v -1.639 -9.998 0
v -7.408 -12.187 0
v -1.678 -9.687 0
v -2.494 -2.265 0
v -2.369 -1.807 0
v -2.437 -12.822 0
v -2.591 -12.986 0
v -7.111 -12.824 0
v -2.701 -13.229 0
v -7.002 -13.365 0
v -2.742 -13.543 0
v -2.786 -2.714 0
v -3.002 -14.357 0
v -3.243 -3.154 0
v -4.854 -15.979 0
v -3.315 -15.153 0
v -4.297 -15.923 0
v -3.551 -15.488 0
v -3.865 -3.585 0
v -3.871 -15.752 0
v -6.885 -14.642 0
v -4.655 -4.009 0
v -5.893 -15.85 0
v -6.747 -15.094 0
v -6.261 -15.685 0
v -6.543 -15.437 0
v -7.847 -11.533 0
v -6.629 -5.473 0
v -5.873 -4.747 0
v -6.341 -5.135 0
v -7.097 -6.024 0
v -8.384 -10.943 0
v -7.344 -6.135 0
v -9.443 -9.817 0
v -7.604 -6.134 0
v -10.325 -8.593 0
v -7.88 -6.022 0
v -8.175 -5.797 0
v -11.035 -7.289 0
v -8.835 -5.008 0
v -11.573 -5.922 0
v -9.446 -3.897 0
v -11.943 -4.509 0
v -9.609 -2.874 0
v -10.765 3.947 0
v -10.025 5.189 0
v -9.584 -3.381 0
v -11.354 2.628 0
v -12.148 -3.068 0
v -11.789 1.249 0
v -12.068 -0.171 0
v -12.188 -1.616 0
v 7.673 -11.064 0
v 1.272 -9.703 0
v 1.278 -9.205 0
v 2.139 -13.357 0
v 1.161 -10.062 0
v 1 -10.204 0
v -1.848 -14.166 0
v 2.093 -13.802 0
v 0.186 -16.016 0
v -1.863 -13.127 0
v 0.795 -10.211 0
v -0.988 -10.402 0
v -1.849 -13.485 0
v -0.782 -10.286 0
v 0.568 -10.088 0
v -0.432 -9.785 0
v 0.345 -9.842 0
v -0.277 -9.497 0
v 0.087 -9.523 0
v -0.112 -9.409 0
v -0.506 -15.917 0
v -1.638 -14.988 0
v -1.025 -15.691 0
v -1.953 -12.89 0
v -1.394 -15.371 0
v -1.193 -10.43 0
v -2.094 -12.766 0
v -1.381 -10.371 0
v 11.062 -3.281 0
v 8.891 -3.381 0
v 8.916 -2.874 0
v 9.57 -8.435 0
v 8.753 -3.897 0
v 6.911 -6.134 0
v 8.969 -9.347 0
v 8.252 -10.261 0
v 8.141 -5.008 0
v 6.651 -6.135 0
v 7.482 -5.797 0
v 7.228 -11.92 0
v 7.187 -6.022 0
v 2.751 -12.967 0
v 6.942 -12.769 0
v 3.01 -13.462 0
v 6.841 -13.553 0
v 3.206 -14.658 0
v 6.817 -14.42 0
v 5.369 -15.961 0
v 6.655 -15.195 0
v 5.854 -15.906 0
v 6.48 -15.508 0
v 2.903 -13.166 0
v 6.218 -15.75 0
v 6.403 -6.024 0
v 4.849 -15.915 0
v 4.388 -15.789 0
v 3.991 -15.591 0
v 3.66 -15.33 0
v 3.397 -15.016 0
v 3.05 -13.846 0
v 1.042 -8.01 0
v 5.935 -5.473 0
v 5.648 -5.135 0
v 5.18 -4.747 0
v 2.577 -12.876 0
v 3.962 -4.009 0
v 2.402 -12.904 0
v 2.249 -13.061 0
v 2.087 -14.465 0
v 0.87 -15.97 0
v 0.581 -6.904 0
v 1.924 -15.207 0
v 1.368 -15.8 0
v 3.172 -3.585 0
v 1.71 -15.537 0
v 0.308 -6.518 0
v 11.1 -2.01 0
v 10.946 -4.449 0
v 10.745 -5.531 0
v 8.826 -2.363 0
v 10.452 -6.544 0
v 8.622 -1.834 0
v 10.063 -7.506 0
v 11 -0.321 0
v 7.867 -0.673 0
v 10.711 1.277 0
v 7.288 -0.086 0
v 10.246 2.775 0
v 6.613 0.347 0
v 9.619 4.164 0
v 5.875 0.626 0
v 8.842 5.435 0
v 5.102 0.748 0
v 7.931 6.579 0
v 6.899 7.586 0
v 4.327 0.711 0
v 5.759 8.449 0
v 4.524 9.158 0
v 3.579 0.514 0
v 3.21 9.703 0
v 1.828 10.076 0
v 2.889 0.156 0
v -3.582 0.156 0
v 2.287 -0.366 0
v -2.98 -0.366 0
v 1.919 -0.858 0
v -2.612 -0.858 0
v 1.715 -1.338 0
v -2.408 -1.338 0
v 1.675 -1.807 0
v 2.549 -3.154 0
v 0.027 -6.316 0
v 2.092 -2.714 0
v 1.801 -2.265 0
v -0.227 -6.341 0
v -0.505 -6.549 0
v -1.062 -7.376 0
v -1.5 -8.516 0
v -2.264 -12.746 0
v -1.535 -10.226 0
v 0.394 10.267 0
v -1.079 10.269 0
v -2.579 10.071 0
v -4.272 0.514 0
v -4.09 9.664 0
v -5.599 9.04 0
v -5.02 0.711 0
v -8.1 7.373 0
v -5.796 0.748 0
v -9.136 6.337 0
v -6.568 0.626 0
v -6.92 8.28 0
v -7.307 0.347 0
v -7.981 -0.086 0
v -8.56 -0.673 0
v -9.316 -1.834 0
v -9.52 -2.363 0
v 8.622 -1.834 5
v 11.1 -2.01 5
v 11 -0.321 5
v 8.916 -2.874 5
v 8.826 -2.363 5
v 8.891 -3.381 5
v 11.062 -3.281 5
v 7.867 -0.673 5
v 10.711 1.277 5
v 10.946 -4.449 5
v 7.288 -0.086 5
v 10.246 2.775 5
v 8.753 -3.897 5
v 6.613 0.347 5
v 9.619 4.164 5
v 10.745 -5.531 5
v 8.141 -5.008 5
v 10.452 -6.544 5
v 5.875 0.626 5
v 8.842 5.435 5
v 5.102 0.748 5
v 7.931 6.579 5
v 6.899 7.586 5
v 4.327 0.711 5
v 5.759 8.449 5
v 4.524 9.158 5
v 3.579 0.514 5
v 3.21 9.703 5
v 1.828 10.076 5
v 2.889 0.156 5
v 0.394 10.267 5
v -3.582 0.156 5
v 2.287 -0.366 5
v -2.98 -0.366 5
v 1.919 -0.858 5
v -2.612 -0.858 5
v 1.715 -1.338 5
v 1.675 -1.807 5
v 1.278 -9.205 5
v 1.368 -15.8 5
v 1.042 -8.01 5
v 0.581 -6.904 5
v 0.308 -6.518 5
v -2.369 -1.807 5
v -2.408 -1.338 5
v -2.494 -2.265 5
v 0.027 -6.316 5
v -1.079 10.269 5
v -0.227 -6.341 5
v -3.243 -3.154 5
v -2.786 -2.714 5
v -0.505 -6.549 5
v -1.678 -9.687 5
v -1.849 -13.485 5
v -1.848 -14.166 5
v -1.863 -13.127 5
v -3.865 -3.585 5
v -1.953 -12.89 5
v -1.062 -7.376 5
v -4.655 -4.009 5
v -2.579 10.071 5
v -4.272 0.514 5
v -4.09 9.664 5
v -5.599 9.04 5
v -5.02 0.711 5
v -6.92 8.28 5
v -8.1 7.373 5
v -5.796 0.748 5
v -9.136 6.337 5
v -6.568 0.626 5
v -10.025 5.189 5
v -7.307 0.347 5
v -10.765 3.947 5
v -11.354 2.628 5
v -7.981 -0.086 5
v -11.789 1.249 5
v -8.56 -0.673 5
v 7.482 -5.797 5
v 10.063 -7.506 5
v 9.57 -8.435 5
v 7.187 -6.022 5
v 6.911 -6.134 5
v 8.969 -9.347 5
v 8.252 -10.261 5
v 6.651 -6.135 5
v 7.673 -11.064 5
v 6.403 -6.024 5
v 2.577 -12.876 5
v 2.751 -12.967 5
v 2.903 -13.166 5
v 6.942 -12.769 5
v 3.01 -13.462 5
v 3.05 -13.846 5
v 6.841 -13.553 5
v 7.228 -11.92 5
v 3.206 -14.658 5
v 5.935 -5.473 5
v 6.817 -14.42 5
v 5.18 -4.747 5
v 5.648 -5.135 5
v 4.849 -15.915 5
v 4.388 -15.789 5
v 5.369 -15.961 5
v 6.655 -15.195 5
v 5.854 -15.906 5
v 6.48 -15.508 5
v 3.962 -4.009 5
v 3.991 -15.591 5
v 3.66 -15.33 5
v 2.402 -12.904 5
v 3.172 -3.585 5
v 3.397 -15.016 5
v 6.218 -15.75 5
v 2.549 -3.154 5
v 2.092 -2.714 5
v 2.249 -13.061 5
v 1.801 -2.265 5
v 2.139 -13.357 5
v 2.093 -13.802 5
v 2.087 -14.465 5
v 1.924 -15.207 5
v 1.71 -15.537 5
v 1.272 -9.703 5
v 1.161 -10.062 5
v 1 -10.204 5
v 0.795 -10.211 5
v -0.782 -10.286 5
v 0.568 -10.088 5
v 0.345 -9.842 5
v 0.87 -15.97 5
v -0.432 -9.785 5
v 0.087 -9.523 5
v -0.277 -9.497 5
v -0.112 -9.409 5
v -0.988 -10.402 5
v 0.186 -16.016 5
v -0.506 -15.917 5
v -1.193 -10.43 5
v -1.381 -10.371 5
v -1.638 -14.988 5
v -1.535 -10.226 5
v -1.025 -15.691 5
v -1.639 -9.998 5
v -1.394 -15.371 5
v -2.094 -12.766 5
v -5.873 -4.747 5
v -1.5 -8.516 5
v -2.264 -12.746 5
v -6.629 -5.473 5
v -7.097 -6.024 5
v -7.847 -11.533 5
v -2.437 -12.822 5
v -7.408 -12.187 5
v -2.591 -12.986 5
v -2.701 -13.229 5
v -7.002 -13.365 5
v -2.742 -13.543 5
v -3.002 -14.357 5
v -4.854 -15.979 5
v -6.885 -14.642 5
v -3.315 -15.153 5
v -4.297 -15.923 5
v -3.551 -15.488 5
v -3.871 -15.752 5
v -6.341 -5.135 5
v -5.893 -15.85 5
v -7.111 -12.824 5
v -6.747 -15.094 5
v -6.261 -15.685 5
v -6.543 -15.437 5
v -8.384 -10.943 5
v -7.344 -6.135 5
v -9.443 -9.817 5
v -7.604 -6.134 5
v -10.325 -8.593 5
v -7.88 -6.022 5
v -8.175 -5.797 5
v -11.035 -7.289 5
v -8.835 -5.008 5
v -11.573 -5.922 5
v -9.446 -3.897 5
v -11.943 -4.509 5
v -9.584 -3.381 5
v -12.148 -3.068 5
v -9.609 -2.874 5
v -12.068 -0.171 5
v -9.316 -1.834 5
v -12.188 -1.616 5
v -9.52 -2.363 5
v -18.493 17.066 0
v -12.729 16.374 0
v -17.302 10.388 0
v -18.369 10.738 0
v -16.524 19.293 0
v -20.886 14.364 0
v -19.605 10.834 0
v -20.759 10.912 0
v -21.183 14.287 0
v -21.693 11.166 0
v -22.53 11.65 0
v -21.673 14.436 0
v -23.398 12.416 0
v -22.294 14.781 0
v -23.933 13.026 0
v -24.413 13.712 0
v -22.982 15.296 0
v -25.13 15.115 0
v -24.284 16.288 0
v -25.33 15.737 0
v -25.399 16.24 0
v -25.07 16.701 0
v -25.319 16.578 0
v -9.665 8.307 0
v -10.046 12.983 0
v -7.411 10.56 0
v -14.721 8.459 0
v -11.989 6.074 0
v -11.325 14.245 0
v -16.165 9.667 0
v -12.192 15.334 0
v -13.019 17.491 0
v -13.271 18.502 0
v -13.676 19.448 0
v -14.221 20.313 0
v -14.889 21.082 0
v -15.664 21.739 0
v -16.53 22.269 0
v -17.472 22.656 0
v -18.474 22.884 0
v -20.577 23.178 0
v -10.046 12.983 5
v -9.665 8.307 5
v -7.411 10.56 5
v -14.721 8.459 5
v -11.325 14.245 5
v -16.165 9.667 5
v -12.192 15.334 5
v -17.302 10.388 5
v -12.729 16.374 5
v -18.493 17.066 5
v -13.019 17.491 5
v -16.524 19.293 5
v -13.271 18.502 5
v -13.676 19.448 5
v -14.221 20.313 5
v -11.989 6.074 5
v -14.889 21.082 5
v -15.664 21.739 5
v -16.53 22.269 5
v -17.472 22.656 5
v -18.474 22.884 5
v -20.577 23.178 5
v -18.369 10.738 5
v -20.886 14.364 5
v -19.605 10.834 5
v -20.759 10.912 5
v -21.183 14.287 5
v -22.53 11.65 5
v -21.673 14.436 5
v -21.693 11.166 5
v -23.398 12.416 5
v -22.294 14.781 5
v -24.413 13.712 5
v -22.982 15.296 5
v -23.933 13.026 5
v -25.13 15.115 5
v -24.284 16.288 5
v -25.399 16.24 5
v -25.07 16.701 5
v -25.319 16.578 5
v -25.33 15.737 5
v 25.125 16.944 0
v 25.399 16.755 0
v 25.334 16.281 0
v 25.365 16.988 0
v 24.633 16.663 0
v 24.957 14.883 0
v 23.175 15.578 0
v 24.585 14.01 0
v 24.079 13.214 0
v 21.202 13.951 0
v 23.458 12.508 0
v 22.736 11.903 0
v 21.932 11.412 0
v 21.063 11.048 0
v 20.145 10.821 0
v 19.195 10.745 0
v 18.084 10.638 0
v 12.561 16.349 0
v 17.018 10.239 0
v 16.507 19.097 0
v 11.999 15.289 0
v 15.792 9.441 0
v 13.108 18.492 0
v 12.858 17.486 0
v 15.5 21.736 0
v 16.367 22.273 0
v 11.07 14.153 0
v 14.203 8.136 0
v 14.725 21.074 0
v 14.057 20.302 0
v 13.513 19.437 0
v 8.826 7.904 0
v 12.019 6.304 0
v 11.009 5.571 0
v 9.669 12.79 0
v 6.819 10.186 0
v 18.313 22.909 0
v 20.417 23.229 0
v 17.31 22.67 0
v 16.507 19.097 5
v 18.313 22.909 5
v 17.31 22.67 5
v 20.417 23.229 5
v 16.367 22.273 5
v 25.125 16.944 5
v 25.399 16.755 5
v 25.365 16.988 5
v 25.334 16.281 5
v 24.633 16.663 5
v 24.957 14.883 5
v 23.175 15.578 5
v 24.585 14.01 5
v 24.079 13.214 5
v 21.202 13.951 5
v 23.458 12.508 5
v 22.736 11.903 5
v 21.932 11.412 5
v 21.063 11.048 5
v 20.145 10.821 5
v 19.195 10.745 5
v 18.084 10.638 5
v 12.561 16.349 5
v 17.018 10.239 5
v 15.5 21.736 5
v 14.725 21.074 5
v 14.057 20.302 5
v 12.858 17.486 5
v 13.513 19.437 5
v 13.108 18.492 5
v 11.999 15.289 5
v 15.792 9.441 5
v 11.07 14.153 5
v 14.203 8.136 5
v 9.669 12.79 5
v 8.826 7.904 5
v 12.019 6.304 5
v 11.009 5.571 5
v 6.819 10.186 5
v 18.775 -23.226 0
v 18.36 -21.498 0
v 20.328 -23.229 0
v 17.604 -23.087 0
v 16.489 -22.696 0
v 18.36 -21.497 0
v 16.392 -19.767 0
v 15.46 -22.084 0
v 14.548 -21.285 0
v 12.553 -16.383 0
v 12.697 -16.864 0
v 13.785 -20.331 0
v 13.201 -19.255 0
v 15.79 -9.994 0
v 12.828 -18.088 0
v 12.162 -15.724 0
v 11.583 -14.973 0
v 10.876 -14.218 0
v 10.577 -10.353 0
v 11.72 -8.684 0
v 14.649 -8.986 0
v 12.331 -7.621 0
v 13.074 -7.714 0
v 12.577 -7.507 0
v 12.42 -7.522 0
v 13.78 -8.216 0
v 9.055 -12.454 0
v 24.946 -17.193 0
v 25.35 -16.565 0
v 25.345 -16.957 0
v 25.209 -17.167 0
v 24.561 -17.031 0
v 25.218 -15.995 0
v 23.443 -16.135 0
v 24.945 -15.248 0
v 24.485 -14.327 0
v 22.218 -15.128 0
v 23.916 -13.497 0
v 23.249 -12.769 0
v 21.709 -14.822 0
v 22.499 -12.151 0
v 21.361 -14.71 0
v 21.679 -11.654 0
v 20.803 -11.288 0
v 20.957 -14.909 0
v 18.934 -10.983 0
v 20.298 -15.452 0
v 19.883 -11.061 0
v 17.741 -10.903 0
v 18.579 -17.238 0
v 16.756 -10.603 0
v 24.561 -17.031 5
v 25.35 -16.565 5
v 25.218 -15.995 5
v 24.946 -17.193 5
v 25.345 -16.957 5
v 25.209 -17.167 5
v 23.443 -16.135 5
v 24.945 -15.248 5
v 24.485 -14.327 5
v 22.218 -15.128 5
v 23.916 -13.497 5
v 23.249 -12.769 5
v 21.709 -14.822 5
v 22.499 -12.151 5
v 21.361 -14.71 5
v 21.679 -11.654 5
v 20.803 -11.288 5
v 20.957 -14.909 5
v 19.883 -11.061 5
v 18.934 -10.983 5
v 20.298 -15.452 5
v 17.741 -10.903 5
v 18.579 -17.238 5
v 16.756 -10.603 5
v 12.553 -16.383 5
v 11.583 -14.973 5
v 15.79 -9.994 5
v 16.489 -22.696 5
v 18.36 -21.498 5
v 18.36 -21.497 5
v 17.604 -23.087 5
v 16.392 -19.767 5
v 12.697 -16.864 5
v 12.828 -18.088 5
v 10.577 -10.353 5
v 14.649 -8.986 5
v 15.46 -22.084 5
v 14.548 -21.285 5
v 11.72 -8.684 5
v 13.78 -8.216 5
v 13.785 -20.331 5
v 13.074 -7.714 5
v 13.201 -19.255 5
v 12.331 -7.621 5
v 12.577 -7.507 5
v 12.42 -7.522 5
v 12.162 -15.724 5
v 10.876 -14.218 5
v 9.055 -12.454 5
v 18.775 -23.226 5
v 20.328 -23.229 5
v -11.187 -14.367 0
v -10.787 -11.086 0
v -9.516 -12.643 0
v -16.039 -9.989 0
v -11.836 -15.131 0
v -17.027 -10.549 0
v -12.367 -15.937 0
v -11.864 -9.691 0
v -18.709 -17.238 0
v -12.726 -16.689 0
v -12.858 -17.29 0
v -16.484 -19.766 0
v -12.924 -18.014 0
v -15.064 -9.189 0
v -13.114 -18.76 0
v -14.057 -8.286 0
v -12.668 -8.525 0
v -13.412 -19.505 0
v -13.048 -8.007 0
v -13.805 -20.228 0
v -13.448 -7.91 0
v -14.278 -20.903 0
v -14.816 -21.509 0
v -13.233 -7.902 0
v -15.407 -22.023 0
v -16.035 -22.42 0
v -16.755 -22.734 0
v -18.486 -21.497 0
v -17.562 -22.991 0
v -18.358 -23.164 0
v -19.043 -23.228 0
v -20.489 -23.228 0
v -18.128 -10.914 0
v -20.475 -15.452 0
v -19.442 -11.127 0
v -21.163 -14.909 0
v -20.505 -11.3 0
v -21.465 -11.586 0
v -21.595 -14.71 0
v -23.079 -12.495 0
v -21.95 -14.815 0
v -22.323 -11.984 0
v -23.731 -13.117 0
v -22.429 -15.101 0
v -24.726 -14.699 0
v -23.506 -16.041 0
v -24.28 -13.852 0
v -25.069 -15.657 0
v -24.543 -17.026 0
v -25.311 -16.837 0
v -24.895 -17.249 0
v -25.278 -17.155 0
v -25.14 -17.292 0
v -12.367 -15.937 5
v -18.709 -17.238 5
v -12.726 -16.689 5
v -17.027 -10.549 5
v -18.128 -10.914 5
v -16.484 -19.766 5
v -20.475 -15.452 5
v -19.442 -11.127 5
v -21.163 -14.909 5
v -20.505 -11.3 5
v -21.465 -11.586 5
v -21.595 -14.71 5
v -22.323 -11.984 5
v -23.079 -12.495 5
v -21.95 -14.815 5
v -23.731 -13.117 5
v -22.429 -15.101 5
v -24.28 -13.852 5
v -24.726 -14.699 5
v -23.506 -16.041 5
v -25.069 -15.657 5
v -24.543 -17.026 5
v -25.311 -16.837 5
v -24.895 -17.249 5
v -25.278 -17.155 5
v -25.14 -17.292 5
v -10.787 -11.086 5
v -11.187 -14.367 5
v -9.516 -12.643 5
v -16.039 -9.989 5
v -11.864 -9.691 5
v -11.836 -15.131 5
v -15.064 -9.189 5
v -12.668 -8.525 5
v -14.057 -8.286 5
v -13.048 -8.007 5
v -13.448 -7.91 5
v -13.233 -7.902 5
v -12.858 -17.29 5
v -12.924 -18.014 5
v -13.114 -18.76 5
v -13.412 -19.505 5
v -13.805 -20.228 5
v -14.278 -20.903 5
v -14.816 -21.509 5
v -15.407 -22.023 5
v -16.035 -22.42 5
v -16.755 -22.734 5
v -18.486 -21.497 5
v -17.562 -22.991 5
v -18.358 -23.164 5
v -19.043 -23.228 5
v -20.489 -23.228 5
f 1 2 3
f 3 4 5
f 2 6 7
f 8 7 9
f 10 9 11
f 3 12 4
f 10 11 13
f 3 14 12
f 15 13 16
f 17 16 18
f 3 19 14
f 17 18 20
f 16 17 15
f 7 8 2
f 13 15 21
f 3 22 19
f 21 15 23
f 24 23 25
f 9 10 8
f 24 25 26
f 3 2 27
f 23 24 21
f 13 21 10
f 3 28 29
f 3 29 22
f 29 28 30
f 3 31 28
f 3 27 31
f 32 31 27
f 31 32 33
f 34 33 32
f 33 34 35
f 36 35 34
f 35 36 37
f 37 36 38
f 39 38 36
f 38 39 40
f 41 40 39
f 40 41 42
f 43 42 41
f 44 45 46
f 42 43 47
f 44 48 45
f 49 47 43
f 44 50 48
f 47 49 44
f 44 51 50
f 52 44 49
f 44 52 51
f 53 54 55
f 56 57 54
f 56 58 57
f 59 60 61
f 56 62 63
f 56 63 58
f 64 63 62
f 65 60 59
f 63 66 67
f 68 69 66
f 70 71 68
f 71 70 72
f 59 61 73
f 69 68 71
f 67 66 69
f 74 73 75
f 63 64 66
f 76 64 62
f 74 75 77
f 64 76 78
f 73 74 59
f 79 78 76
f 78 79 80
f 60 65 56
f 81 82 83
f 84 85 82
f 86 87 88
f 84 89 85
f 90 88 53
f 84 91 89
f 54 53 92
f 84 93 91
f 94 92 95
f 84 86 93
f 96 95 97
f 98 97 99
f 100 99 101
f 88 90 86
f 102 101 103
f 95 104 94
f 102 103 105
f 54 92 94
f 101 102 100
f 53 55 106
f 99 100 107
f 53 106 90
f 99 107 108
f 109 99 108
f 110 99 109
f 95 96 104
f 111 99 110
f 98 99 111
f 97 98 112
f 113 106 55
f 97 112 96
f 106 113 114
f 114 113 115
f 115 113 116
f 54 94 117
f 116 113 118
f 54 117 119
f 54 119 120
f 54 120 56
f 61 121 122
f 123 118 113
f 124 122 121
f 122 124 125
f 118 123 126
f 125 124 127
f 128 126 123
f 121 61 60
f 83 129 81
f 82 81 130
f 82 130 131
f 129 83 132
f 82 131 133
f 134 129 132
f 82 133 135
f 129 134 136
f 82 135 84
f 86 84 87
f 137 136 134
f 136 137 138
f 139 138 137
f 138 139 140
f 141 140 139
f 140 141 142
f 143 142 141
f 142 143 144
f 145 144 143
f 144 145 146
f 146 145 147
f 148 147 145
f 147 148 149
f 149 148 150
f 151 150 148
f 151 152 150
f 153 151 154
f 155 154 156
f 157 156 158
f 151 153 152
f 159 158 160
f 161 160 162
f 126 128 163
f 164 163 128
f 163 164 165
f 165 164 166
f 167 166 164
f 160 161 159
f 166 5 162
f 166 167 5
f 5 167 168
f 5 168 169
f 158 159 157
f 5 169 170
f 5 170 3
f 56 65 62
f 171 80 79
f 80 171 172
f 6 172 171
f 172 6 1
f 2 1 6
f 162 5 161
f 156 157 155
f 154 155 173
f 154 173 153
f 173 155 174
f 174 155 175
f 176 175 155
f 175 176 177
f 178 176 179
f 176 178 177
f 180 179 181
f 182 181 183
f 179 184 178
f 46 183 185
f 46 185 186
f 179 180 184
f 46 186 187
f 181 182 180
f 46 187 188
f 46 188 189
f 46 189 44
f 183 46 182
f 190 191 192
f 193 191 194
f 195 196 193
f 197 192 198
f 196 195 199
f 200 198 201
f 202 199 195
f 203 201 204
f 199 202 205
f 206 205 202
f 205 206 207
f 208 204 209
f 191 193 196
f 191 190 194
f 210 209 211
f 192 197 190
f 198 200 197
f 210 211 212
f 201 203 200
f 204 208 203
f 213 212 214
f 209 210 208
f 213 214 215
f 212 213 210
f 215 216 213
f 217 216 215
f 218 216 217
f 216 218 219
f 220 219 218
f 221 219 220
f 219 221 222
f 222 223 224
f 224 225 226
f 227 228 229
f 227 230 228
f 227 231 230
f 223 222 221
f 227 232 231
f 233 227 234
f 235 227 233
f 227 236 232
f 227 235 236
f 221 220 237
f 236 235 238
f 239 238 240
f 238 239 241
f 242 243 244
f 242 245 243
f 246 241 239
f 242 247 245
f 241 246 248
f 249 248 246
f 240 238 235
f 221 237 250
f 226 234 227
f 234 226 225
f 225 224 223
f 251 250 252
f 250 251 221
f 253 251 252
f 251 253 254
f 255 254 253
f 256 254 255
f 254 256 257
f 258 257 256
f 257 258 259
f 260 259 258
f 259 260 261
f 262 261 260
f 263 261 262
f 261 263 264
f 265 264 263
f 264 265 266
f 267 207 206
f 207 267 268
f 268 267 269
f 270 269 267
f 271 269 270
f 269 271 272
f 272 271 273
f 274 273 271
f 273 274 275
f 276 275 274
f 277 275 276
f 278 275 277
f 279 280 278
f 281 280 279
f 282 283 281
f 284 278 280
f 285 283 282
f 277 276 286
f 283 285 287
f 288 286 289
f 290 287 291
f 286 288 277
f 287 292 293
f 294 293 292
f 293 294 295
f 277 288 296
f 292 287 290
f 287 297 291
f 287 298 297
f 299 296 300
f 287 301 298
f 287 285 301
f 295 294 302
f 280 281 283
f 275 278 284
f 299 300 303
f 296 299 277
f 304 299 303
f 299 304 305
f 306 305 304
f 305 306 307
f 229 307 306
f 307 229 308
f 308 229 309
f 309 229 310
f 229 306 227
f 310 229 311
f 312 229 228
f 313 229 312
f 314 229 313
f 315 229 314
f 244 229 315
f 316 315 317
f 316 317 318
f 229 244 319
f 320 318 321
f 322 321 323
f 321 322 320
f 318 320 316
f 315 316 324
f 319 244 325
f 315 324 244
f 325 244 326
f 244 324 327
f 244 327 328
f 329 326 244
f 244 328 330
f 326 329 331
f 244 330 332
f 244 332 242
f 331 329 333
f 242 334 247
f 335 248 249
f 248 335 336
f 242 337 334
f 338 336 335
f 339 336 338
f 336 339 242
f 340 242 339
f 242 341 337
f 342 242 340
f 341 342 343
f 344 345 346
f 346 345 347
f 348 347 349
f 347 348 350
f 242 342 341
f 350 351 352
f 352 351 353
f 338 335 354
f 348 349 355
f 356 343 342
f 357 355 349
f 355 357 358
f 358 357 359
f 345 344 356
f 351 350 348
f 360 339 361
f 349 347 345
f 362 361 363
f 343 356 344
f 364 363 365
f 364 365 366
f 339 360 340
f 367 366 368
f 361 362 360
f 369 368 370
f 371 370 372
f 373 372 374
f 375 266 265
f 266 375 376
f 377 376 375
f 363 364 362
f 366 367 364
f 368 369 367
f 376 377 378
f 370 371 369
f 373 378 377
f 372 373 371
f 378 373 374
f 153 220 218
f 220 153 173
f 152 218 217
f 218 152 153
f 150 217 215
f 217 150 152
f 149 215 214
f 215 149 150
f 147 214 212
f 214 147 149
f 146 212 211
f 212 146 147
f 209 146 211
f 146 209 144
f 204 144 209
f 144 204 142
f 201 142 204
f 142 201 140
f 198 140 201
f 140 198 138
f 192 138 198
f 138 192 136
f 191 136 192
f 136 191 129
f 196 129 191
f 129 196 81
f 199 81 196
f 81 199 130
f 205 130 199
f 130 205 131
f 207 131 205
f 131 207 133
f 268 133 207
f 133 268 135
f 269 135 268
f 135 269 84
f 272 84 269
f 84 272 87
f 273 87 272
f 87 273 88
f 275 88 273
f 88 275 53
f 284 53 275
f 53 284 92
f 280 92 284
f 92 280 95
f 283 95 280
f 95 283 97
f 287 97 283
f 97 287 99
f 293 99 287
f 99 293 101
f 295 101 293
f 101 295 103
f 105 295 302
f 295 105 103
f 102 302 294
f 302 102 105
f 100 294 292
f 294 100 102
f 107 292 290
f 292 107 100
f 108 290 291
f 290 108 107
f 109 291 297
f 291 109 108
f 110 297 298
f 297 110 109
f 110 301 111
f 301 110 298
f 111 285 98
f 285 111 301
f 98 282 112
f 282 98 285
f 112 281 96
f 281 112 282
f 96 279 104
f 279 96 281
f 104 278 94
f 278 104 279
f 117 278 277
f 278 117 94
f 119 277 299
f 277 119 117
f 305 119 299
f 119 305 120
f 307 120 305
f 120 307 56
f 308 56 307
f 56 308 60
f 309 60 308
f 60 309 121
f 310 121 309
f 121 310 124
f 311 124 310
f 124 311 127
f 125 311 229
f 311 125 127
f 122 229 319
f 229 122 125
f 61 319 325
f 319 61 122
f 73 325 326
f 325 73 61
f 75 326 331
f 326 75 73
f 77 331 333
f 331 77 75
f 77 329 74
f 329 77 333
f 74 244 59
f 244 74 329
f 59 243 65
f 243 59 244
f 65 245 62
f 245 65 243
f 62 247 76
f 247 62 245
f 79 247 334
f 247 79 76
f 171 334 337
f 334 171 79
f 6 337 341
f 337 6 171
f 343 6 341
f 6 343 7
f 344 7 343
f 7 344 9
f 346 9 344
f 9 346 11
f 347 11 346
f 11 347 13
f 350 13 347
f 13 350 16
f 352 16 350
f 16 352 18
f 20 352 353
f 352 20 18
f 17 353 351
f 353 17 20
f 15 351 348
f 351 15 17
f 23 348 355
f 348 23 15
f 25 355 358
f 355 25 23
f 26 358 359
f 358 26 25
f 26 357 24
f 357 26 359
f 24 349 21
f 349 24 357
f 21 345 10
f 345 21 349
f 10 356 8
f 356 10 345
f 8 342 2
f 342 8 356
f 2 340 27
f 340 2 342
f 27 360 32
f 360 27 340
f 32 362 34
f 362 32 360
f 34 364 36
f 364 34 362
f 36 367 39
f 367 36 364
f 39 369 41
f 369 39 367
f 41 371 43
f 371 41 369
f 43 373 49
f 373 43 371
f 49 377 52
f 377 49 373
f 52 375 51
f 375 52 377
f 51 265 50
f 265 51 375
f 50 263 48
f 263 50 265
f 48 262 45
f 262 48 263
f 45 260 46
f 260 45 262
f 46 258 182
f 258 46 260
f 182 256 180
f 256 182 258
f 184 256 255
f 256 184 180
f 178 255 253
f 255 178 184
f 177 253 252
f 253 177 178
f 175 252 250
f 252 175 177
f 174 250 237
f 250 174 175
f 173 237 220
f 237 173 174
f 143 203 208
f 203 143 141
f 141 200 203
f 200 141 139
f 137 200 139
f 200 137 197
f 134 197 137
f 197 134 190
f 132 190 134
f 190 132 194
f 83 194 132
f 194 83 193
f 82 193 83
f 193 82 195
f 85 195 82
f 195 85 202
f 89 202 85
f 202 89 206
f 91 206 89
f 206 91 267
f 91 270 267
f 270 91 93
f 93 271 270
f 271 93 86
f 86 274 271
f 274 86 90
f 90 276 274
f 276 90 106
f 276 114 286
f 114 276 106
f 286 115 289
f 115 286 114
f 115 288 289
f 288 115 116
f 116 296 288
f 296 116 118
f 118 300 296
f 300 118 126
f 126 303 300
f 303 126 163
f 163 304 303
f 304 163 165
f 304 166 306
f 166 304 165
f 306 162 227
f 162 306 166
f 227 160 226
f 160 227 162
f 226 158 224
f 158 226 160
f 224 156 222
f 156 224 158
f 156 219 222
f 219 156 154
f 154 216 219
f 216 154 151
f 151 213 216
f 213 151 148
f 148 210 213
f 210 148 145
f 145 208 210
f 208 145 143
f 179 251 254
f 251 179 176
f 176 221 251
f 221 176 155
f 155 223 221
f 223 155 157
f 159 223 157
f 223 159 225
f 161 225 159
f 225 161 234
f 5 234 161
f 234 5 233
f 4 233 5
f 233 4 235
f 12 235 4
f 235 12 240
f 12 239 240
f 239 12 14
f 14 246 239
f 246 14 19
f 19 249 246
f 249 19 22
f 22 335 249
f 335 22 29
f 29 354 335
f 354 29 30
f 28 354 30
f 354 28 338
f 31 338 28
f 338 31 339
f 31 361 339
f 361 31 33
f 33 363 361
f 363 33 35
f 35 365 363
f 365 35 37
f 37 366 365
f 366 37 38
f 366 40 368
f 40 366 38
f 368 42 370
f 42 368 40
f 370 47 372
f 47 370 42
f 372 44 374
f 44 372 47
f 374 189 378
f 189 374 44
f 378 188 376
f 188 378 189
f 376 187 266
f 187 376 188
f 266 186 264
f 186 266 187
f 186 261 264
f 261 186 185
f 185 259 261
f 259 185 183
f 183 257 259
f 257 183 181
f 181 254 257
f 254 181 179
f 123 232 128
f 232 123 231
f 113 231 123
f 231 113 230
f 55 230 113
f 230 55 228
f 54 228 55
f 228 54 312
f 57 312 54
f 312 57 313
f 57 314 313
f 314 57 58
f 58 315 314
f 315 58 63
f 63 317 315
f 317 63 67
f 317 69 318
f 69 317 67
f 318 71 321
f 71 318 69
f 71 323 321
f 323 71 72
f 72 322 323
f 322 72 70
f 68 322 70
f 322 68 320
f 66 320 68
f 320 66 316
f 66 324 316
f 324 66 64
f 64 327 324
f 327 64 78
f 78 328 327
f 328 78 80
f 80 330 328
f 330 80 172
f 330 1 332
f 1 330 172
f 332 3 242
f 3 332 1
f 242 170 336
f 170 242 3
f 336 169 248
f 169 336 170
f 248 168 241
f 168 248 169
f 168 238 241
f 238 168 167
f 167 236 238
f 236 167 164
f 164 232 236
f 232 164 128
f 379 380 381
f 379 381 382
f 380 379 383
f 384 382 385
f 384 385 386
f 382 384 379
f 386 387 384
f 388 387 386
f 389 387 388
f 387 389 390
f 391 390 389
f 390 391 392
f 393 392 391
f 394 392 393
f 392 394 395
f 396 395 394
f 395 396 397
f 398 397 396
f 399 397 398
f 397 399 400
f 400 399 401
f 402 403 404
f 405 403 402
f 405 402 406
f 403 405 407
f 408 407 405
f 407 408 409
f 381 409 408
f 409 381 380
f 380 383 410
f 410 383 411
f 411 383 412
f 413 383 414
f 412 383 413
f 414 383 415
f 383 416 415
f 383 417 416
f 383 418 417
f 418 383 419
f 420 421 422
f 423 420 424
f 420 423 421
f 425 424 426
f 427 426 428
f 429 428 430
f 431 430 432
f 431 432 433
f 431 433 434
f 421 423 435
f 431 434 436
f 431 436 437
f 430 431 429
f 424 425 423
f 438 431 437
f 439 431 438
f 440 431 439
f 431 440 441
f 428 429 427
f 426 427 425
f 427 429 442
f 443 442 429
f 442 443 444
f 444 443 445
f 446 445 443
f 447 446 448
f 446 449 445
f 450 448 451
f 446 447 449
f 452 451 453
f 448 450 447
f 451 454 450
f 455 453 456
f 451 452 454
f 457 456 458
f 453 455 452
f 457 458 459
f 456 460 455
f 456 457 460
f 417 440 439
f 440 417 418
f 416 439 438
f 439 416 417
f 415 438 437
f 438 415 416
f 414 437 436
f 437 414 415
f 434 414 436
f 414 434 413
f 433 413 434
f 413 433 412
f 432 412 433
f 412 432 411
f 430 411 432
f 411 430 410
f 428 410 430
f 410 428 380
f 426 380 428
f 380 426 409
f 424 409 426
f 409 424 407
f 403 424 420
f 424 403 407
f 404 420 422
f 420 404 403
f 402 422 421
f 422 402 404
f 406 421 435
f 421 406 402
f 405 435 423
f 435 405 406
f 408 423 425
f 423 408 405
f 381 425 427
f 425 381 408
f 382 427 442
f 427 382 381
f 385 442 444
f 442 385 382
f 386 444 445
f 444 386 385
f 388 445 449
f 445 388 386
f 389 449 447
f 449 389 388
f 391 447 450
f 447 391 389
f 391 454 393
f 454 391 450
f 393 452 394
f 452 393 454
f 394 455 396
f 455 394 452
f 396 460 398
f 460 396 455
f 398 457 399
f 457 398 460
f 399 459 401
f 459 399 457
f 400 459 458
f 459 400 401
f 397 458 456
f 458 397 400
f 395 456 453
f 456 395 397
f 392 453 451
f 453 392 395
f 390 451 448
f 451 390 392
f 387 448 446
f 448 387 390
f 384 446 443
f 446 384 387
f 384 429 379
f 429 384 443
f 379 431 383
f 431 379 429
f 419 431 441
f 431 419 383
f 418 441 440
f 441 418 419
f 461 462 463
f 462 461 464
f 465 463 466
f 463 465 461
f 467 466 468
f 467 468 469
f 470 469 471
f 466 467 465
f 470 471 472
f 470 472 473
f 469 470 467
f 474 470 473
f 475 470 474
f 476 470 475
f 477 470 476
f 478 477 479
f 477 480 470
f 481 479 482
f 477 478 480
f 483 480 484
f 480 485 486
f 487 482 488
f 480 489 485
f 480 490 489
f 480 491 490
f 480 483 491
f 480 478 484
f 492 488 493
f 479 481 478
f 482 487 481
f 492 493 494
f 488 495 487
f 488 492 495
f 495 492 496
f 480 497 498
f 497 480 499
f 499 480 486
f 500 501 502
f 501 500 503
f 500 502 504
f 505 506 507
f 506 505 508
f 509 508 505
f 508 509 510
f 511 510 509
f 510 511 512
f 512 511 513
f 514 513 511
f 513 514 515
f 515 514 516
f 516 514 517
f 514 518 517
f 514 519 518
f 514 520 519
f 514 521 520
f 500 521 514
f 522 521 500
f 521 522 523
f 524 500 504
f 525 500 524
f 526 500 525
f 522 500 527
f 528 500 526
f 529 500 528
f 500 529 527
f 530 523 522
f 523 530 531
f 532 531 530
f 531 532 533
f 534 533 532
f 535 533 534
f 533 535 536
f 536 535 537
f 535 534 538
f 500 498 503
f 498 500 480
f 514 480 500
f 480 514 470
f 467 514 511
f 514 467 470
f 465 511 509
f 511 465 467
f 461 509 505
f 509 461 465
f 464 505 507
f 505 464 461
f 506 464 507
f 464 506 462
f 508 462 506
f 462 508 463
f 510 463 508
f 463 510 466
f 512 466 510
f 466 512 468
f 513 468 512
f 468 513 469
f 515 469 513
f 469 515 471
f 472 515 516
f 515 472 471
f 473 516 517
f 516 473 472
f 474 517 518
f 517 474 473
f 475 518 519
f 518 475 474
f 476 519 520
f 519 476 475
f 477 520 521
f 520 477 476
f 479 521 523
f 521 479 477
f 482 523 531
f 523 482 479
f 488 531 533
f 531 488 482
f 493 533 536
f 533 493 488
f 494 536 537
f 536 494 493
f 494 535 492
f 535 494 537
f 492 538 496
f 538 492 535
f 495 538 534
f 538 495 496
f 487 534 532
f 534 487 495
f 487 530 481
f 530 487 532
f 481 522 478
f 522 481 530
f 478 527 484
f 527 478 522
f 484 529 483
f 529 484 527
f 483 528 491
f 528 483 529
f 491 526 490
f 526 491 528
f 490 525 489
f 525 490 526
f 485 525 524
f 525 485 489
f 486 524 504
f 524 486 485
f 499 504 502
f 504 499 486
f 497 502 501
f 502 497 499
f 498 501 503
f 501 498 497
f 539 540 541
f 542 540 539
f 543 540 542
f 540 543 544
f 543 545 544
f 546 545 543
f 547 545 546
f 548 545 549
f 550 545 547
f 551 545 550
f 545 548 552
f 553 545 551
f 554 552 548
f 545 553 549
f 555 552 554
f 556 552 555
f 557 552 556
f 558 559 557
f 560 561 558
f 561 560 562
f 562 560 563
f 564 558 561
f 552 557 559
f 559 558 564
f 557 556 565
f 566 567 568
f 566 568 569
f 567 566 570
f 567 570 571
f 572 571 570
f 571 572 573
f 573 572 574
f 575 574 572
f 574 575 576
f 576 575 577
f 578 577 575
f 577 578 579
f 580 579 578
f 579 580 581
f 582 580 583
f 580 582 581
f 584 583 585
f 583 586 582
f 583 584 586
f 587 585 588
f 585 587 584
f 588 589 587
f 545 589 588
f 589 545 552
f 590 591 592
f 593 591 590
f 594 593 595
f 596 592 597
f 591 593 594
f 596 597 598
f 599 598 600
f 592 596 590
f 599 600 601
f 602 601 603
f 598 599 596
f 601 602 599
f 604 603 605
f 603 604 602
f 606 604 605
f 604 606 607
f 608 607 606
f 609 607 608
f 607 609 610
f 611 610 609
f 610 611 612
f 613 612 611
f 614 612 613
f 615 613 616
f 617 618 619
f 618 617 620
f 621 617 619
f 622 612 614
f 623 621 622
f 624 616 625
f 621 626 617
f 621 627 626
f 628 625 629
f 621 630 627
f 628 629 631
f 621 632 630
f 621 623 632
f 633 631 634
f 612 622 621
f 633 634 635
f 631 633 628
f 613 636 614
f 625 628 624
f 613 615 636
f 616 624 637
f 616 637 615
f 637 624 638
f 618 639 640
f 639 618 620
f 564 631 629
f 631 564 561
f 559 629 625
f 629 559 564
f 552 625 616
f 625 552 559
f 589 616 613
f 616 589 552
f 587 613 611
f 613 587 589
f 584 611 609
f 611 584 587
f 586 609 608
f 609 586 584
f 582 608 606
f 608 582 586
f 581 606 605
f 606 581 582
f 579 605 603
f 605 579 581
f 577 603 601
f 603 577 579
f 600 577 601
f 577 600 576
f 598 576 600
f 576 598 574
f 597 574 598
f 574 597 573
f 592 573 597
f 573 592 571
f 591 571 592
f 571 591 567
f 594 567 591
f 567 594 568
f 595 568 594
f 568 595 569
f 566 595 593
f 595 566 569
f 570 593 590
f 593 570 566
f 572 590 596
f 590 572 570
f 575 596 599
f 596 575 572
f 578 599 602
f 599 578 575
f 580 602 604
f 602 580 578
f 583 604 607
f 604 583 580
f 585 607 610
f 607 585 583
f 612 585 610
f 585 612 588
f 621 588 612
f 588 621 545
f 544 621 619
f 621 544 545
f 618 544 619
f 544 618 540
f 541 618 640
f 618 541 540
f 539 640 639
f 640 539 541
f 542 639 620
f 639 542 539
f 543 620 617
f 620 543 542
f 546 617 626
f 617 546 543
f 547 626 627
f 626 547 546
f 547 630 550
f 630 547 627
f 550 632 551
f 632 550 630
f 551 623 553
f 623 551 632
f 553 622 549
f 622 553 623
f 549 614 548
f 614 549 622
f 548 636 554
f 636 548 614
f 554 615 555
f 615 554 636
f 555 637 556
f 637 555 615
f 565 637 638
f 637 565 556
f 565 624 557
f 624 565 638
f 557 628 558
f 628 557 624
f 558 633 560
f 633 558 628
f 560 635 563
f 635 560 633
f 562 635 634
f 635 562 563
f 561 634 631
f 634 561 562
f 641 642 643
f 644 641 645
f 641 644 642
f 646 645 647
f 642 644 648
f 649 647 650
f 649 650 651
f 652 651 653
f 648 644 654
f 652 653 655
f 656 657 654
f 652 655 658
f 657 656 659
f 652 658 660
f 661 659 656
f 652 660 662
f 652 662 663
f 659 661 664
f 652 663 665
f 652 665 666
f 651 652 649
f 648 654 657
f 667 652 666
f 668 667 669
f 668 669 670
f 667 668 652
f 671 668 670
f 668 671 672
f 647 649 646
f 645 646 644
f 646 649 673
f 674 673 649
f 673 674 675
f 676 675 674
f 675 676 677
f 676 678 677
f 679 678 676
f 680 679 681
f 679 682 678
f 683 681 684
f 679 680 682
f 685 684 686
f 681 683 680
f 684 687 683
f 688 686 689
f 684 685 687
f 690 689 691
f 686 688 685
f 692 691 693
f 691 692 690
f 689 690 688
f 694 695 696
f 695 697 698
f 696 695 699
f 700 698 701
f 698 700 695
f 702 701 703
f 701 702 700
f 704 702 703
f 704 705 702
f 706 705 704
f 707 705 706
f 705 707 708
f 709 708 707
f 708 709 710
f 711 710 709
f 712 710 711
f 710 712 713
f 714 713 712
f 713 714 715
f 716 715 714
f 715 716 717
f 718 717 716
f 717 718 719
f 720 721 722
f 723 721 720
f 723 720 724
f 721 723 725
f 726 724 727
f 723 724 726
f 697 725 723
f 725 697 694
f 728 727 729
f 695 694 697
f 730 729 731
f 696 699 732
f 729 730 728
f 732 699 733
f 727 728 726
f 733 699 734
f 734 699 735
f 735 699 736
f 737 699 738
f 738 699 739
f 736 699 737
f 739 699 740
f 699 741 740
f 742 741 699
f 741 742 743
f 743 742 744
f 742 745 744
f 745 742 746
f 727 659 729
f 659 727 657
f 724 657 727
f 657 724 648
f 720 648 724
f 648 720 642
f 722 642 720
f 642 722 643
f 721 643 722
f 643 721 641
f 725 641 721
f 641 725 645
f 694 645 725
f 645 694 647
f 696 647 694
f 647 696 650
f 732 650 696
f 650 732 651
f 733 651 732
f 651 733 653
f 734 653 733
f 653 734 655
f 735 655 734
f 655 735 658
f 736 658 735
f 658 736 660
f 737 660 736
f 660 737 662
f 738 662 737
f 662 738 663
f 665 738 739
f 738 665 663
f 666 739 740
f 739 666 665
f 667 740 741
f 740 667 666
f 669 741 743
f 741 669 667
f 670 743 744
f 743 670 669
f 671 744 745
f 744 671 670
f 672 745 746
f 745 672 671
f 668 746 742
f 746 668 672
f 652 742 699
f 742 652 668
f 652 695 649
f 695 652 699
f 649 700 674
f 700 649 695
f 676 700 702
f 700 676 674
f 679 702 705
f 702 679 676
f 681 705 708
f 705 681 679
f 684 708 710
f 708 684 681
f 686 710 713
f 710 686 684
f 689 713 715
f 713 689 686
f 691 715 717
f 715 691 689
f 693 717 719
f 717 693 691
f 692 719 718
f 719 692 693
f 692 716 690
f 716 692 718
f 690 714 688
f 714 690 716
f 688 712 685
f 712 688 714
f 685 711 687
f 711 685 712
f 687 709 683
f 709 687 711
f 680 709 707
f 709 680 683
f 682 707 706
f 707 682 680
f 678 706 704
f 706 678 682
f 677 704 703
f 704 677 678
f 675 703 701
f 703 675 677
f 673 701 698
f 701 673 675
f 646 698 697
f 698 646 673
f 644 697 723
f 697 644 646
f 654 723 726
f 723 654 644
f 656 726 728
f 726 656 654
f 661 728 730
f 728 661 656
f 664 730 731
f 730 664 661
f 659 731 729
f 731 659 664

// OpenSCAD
// [FL_INDEX: keywords="openscad, 3d_parametric, Hack_a_Day_Skull_and_Wrenches_Logo, csg_solid" | COT="Parametric OpenSCAD design from 3DCodeverse"]
// Title: Hack a Day Skull and Wrenches Logo

//
// Brian Benchoff at HackADay, noted there was no Hack A Day logo to play with the new makerbot Customizer tool in a post at: 
//   http://www.hackaday.com/2013/02/16/custom-3d-printed-designs-with-makerbots-customizer
//
// I built this to play around. Currently DXF import is unsupported by http://customizer.makerbot.com
// 
// Here is the highlevel of how I did it and the tools used:
//
// Downloaded Hack a Day logo from http://hackaday.com
// Imported into Inkscape, traced, cleaned up, set stroke and fill to black, set path name, set Doc Defaults to mm, scaled to ~50mm.
// Exported to OpenScad Format with Inkscape to OpenSCAD converter v2 from:
//   http://www.thingiverse.com/thing:25036
// Hand edited the OpenScad output to add Variables and make nice for Customizer!
//
// -- BoorT


// Module names are of the form poly_<inkscape-path-id>().  As a result,
// you can associate a polygon in this OpenSCAD program with the corresponding
// SVG element in the Inkscape document by looking for the XML element with
// the attribute id="inkscape-path-id".

// preview[view:south, tilt:top]

// How Wide to make the Logo?   Default is 1 which is about 50mm square. Choose 2 for twice as wide.
LogoScaleX=1; //

// How High to make the Logo?   Default is 1 which is about 50mm square. Choose 2 for twice as high.
LogoScaleY=1; //

// How tall to make the Logo?   Default is 5mm 
ExtrudeHeight = 5; // [.5:50]

// What color would you like: Default is Green. See http://en.wikipedia.org/wiki/Web_colors for valid options.
LogoColor = "green"; 

// The fudge value is used to ensure that subtracted solids are a tad taller in the z dimension than the polygon being  subtracted from.  This helps keep the resulting .stl file manifold. Defualt of 0.1mm should work for most uses.
fudge = 0.1; // [0.1:1]

module poly_HackADayLogo(h)
{
  scale([25.4/90, -25.4/90, 1]) union()
  {
    linear_extrude(height=h)
      polygon([[-34.245637,-29.433885],[-26.261107,-37.418335],[-35.596937,-46.002585],[-40.128276,-50.474831],[-43.199657,-54.332354],[-45.103423,-58.018425],[-46.131917,-61.976315],[-47.021502,-65.557463],[-48.459276,-68.908636],[-50.389209,-71.974442],[-52.755268,-74.699486],[-55.501423,-77.028375],[-58.571640,-78.905716],[-61.909889,-80.276114],[-65.460137,-81.084175],[-72.912299,-82.125795],[-65.730667,-75.243785],[-58.549047,-68.361755],[-65.524687,-60.468455],[-74.007293,-50.896895],[-75.057492,-50.624528],[-76.793965,-51.150160],[-78.993311,-52.374462],[-81.432125,-54.198105],[-86.046363,-57.714861],[-88.830039,-59.177585],[-89.712158,-58.740916],[-89.997226,-57.544865],[-89.751947,-55.760365],[-89.043023,-53.558351],[-86.501051,-48.585515],[-84.801409,-46.156559],[-82.904932,-43.993825],[-79.831674,-41.280832],[-76.863311,-39.565664],[-73.556015,-38.663194],[-69.465957,-38.388295],[-65.086361,-38.049234],[-61.305237,-36.807219],[-57.278391,-34.251652],[-52.161627,-29.971935],[-42.479837,-21.521895],[-34.245637,-29.433885]]);
    linear_extrude(height=h)
      polygon([[50.325821,-28.828675],[55.957113,-33.450676],[60.299203,-36.279533],[64.076488,-37.693810],[68.013361,-38.072075],[71.378186,-38.342122],[74.631190,-39.145109],[77.712163,-40.437796],[80.560892,-42.176943],[83.117167,-44.319306],[85.320776,-46.821647],[87.111507,-49.640724],[88.429151,-52.733295],[89.765511,-57.687719],[89.997226,-59.369685],[89.874721,-60.195035],[89.026068,-60.037145],[87.280642,-59.041989],[82.117611,-55.195985],[75.125141,-49.432265],[66.806471,-58.549335],[58.487771,-67.666425],[65.415061,-74.986215],[72.342351,-82.306025],[64.890181,-81.174295],[61.334333,-80.325112],[57.992543,-78.921395],[54.920558,-77.018562],[52.174127,-74.672031],[49.808996,-71.937220],[47.880913,-68.869547],[46.445626,-65.524429],[45.558881,-61.957285],[44.506993,-57.928705],[42.517242,-54.172484],[39.223453,-50.149486],[34.259451,-45.320575],[24.162271,-36.092395],[31.274481,-28.005385],[39.007281,-19.740695],[42.588068,-22.337006],[50.325821,-28.828675]]);
    difference()
    {
       linear_extrude(height=h)
         polygon([[-9.717087,47.988025],[-9.568745,46.875196],[-9.180220,46.013970],[-8.636261,45.433837],[-8.021618,45.164287],[-7.421043,45.234811],[-6.919284,45.674898],[-6.601092,46.514040],[-6.551217,47.781725],[-6.549053,50.195964],[-5.804445,53.108137],[-4.939182,54.463703],[-3.630858,55.599055],[-1.793655,56.399295],[0.658243,56.749525],[3.082099,56.585008],[4.847189,55.985106],[6.057338,55.050958],[6.816372,53.883700],[7.396395,51.254406],[7.417863,48.906325],[7.577543,47.327482],[7.968219,46.278839],[8.512131,45.723586],[9.131519,45.624912],[9.748625,45.946010],[10.285689,46.650067],[10.664950,47.700276],[10.808651,49.059825],[11.361433,51.938053],[12.037702,53.206860],[12.967483,54.318975],[14.140970,55.242034],[15.548357,55.943672],[17.179839,56.391524],[19.025611,56.553225],[20.742303,56.361605],[22.033485,55.808250],[22.959758,54.949045],[23.581723,53.839875],[24.155138,51.095175],[24.238541,48.021225],[24.596453,45.244995],[25.609800,42.234962],[27.188000,39.202336],[29.240471,36.358325],[31.779553,33.120117],[33.910820,29.886715],[35.655621,26.596251],[37.035308,23.186857],[38.071232,19.596668],[38.784743,15.763816],[39.197192,11.626434],[39.329931,7.122655],[38.977710,1.138705],[37.953338,-4.523229],[36.305249,-9.831098],[34.081878,-14.752852],[31.331661,-19.256440],[28.103032,-23.309814],[24.444427,-26.880922],[20.404281,-29.937716],[16.031027,-32.448146],[11.373103,-34.380161],[6.478941,-35.701711],[1.396979,-36.380748],[-3.824351,-36.385220],[-9.136611,-35.683079],[-14.491369,-34.242274],[-19.840187,-32.030755],[-24.521238,-29.338392],[-28.700709,-26.125628],[-32.369959,-22.454467],[-35.520345,-18.386913],[-38.143227,-13.984971],[-40.229963,-9.310644],[-41.771910,-4.425937],[-42.760428,0.607146],[-43.186876,5.726601],[-43.042610,10.870422],[-42.318991,15.976607],[-41.007376,20.983150],[-39.099123,25.828048],[-36.585592,30.449296],[-33.458141,34.784890],[-29.708127,38.772825],[-27.805685,40.864942],[-26.247753,43.180587],[-25.195098,45.438127],[-24.808487,47.355925],[-24.396732,51.880802],[-23.908060,53.481506],[-23.182963,54.699362],[-22.185522,55.578102],[-20.879814,56.161455],[-17.199917,56.616925],[-15.226510,56.420608],[-13.715190,55.815042],[-12.583206,54.878809],[-11.747808,53.690487],[-10.635774,50.871902],[-9.717087,47.987925]]);
       translate([0, 0, -fudge])
         linear_extrude(height=h+2*fudge)
           polygon([[21.031031,19.393105],[20.012468,18.196454],[18.354321,16.819486],[14.037211,14.205495],[11.240257,12.703217],[9.032853,11.174221],[7.413837,9.615983],[6.382051,8.025982],[5.936335,6.401696],[6.075530,4.740603],[6.798476,3.040180],[8.104013,1.297905],[10.235055,-0.551777],[12.680187,-1.822225],[15.330971,-2.519401],[18.078975,-2.649269],[20.815762,-2.217791],[23.432897,-1.230930],[25.821945,0.305349],[27.874471,2.385085],[30.551567,6.499975],[31.274293,8.372375],[31.590402,10.183461],[31.502843,11.979771],[31.014564,13.807841],[28.847641,17.745415],[26.510311,20.541054],[25.464749,21.337188],[24.486692,21.735269],[23.565215,21.737598],[22.689395,21.346480],[21.031031,19.393105]]);
       translate([0, 0, -fudge])
         linear_extrude(height=h+2*fudge)
           polygon([[-31.304007,17.745415],[-33.470932,13.807841],[-33.959212,11.979771],[-34.046772,10.183461],[-33.730664,8.372375],[-33.007938,6.499975],[-30.330837,2.385085],[-28.278317,0.305349],[-25.889273,-1.230930],[-23.272139,-2.217791],[-20.535352,-2.649269],[-17.787347,-2.519401],[-15.136559,-1.822225],[-12.691424,-0.551777],[-10.560377,1.297905],[-9.254841,3.040180],[-8.531896,4.740603],[-8.392703,6.401696],[-8.838420,8.025982],[-9.870206,9.615983],[-11.489222,11.174221],[-13.696626,12.703217],[-16.493577,14.205495],[-20.810687,16.819486],[-22.468835,18.196454],[-23.487397,19.393105],[-25.145761,21.346480],[-26.021581,21.737598],[-26.943058,21.735269],[-27.921116,21.337188],[-28.966677,20.541054],[-31.304007,17.745415]]);
       translate([0, 0, -fudge])
         linear_extrude(height=h+2*fudge)
           polygon([[-5.944247,34.322425],[-5.314545,30.174909],[-3.761738,26.136832],[-1.790276,23.205737],[-0.805189,22.467040],[0.095393,22.379165],[1.090800,23.096398],[2.060227,24.462153],[3.691414,28.380556],[4.529500,32.617029],[4.507551,34.380371],[4.115033,35.654225],[3.543999,36.157431],[2.815473,36.179775],[2.013477,35.743944],[1.222033,34.872625],[0.308298,33.743859],[-0.397633,33.338225],[-0.981489,33.649441],[-1.528997,34.671225],[-2.771148,36.446003],[-3.501289,36.856548],[-4.227527,36.955250],[-4.892402,36.746649],[-5.438454,36.235284],[-5.808222,35.425696],[-5.944247,34.322425]]);
    }
    linear_extrude(height=h)
      polygon([[65.055381,76.172225],[58.083021,70.041325],[65.831051,61.080925],[71.922358,54.752650],[74.257270,52.827559],[75.687151,52.120525],[76.921587,52.519003],[78.724361,53.603975],[83.066391,57.170625],[87.027424,60.346466],[88.392209,60.919262],[89.324085,60.828550],[89.806235,60.084260],[89.821846,58.696322],[89.354099,56.674667],[88.386181,54.029225],[86.759258,50.763643],[84.741099,47.823558],[82.379442,45.242847],[79.722025,43.055387],[76.816583,41.295058],[73.710855,39.995736],[70.452579,39.191299],[67.089491,38.915625],[62.860811,38.631619],[59.373298,37.568775],[55.948264,35.410856],[51.907021,31.841625],[48.826105,29.110067],[46.325870,27.331666],[44.562890,26.598662],[44.006801,26.653009],[43.693741,27.003295],[41.527923,30.768887],[37.477611,36.682825],[32.085311,44.126625],[38.537251,50.380025],[41.042421,53.054408],[43.093940,55.713387],[44.480101,58.049361],[44.989201,59.754725],[45.454185,64.091820],[46.775724,68.225312],[48.843694,72.039943],[51.547976,75.420450],[54.778446,78.251573],[58.424983,80.418050],[62.377465,81.804621],[66.525771,82.296025],[72.027731,82.306025],[65.055381,76.175125]]);
    linear_extrude(height=h)
      polygon([[-56.815957,79.441525],[-54.591631,78.033304],[-52.499413,76.214536],[-50.589995,74.067078],[-48.914070,71.672787],[-47.522330,69.113520],[-46.465468,66.471133],[-45.794176,63.827482],[-45.559147,61.264425],[-45.091945,59.132845],[-43.819857,56.469562],[-41.937165,53.614411],[-39.638147,50.907225],[-33.717137,44.798425],[-38.223337,39.280125],[-42.039476,34.338837],[-44.886637,30.207925],[-46.231599,28.370215],[-46.889618,27.999901],[-47.649343,28.026116],[-49.807962,29.360647],[-53.375547,32.558825],[-56.832517,35.395111],[-60.332556,37.379762],[-64.232673,38.670795],[-68.889877,39.426225],[-72.655448,40.039614],[-76.058572,41.052089],[-79.098563,42.463097],[-81.774733,44.272087],[-84.086395,46.478507],[-86.032861,49.081805],[-87.613443,52.081428],[-88.827454,55.476825],[-89.682935,59.659502],[-89.566044,60.786352],[-89.077811,61.272237],[-88.212044,61.118678],[-86.962553,60.327192],[-83.287631,56.836525],[-79.471072,53.505850],[-77.775000,52.492647],[-76.516633,52.120525],[-74.985704,52.827333],[-72.547486,54.751812],[-66.291267,61.078125],[-58.406397,70.035725],[-65.502047,76.169425],[-72.597681,82.303025],[-67.473647,82.303025],[-65.047435,82.077231],[-62.229278,81.462450],[-59.368884,80.552581],[-56.815957,79.441525]]);
  }
}

scale([LogoScaleX, LogoScaleY , 1])
color(LogoColor)
poly_HackADayLogo(ExtrudeHeight);
